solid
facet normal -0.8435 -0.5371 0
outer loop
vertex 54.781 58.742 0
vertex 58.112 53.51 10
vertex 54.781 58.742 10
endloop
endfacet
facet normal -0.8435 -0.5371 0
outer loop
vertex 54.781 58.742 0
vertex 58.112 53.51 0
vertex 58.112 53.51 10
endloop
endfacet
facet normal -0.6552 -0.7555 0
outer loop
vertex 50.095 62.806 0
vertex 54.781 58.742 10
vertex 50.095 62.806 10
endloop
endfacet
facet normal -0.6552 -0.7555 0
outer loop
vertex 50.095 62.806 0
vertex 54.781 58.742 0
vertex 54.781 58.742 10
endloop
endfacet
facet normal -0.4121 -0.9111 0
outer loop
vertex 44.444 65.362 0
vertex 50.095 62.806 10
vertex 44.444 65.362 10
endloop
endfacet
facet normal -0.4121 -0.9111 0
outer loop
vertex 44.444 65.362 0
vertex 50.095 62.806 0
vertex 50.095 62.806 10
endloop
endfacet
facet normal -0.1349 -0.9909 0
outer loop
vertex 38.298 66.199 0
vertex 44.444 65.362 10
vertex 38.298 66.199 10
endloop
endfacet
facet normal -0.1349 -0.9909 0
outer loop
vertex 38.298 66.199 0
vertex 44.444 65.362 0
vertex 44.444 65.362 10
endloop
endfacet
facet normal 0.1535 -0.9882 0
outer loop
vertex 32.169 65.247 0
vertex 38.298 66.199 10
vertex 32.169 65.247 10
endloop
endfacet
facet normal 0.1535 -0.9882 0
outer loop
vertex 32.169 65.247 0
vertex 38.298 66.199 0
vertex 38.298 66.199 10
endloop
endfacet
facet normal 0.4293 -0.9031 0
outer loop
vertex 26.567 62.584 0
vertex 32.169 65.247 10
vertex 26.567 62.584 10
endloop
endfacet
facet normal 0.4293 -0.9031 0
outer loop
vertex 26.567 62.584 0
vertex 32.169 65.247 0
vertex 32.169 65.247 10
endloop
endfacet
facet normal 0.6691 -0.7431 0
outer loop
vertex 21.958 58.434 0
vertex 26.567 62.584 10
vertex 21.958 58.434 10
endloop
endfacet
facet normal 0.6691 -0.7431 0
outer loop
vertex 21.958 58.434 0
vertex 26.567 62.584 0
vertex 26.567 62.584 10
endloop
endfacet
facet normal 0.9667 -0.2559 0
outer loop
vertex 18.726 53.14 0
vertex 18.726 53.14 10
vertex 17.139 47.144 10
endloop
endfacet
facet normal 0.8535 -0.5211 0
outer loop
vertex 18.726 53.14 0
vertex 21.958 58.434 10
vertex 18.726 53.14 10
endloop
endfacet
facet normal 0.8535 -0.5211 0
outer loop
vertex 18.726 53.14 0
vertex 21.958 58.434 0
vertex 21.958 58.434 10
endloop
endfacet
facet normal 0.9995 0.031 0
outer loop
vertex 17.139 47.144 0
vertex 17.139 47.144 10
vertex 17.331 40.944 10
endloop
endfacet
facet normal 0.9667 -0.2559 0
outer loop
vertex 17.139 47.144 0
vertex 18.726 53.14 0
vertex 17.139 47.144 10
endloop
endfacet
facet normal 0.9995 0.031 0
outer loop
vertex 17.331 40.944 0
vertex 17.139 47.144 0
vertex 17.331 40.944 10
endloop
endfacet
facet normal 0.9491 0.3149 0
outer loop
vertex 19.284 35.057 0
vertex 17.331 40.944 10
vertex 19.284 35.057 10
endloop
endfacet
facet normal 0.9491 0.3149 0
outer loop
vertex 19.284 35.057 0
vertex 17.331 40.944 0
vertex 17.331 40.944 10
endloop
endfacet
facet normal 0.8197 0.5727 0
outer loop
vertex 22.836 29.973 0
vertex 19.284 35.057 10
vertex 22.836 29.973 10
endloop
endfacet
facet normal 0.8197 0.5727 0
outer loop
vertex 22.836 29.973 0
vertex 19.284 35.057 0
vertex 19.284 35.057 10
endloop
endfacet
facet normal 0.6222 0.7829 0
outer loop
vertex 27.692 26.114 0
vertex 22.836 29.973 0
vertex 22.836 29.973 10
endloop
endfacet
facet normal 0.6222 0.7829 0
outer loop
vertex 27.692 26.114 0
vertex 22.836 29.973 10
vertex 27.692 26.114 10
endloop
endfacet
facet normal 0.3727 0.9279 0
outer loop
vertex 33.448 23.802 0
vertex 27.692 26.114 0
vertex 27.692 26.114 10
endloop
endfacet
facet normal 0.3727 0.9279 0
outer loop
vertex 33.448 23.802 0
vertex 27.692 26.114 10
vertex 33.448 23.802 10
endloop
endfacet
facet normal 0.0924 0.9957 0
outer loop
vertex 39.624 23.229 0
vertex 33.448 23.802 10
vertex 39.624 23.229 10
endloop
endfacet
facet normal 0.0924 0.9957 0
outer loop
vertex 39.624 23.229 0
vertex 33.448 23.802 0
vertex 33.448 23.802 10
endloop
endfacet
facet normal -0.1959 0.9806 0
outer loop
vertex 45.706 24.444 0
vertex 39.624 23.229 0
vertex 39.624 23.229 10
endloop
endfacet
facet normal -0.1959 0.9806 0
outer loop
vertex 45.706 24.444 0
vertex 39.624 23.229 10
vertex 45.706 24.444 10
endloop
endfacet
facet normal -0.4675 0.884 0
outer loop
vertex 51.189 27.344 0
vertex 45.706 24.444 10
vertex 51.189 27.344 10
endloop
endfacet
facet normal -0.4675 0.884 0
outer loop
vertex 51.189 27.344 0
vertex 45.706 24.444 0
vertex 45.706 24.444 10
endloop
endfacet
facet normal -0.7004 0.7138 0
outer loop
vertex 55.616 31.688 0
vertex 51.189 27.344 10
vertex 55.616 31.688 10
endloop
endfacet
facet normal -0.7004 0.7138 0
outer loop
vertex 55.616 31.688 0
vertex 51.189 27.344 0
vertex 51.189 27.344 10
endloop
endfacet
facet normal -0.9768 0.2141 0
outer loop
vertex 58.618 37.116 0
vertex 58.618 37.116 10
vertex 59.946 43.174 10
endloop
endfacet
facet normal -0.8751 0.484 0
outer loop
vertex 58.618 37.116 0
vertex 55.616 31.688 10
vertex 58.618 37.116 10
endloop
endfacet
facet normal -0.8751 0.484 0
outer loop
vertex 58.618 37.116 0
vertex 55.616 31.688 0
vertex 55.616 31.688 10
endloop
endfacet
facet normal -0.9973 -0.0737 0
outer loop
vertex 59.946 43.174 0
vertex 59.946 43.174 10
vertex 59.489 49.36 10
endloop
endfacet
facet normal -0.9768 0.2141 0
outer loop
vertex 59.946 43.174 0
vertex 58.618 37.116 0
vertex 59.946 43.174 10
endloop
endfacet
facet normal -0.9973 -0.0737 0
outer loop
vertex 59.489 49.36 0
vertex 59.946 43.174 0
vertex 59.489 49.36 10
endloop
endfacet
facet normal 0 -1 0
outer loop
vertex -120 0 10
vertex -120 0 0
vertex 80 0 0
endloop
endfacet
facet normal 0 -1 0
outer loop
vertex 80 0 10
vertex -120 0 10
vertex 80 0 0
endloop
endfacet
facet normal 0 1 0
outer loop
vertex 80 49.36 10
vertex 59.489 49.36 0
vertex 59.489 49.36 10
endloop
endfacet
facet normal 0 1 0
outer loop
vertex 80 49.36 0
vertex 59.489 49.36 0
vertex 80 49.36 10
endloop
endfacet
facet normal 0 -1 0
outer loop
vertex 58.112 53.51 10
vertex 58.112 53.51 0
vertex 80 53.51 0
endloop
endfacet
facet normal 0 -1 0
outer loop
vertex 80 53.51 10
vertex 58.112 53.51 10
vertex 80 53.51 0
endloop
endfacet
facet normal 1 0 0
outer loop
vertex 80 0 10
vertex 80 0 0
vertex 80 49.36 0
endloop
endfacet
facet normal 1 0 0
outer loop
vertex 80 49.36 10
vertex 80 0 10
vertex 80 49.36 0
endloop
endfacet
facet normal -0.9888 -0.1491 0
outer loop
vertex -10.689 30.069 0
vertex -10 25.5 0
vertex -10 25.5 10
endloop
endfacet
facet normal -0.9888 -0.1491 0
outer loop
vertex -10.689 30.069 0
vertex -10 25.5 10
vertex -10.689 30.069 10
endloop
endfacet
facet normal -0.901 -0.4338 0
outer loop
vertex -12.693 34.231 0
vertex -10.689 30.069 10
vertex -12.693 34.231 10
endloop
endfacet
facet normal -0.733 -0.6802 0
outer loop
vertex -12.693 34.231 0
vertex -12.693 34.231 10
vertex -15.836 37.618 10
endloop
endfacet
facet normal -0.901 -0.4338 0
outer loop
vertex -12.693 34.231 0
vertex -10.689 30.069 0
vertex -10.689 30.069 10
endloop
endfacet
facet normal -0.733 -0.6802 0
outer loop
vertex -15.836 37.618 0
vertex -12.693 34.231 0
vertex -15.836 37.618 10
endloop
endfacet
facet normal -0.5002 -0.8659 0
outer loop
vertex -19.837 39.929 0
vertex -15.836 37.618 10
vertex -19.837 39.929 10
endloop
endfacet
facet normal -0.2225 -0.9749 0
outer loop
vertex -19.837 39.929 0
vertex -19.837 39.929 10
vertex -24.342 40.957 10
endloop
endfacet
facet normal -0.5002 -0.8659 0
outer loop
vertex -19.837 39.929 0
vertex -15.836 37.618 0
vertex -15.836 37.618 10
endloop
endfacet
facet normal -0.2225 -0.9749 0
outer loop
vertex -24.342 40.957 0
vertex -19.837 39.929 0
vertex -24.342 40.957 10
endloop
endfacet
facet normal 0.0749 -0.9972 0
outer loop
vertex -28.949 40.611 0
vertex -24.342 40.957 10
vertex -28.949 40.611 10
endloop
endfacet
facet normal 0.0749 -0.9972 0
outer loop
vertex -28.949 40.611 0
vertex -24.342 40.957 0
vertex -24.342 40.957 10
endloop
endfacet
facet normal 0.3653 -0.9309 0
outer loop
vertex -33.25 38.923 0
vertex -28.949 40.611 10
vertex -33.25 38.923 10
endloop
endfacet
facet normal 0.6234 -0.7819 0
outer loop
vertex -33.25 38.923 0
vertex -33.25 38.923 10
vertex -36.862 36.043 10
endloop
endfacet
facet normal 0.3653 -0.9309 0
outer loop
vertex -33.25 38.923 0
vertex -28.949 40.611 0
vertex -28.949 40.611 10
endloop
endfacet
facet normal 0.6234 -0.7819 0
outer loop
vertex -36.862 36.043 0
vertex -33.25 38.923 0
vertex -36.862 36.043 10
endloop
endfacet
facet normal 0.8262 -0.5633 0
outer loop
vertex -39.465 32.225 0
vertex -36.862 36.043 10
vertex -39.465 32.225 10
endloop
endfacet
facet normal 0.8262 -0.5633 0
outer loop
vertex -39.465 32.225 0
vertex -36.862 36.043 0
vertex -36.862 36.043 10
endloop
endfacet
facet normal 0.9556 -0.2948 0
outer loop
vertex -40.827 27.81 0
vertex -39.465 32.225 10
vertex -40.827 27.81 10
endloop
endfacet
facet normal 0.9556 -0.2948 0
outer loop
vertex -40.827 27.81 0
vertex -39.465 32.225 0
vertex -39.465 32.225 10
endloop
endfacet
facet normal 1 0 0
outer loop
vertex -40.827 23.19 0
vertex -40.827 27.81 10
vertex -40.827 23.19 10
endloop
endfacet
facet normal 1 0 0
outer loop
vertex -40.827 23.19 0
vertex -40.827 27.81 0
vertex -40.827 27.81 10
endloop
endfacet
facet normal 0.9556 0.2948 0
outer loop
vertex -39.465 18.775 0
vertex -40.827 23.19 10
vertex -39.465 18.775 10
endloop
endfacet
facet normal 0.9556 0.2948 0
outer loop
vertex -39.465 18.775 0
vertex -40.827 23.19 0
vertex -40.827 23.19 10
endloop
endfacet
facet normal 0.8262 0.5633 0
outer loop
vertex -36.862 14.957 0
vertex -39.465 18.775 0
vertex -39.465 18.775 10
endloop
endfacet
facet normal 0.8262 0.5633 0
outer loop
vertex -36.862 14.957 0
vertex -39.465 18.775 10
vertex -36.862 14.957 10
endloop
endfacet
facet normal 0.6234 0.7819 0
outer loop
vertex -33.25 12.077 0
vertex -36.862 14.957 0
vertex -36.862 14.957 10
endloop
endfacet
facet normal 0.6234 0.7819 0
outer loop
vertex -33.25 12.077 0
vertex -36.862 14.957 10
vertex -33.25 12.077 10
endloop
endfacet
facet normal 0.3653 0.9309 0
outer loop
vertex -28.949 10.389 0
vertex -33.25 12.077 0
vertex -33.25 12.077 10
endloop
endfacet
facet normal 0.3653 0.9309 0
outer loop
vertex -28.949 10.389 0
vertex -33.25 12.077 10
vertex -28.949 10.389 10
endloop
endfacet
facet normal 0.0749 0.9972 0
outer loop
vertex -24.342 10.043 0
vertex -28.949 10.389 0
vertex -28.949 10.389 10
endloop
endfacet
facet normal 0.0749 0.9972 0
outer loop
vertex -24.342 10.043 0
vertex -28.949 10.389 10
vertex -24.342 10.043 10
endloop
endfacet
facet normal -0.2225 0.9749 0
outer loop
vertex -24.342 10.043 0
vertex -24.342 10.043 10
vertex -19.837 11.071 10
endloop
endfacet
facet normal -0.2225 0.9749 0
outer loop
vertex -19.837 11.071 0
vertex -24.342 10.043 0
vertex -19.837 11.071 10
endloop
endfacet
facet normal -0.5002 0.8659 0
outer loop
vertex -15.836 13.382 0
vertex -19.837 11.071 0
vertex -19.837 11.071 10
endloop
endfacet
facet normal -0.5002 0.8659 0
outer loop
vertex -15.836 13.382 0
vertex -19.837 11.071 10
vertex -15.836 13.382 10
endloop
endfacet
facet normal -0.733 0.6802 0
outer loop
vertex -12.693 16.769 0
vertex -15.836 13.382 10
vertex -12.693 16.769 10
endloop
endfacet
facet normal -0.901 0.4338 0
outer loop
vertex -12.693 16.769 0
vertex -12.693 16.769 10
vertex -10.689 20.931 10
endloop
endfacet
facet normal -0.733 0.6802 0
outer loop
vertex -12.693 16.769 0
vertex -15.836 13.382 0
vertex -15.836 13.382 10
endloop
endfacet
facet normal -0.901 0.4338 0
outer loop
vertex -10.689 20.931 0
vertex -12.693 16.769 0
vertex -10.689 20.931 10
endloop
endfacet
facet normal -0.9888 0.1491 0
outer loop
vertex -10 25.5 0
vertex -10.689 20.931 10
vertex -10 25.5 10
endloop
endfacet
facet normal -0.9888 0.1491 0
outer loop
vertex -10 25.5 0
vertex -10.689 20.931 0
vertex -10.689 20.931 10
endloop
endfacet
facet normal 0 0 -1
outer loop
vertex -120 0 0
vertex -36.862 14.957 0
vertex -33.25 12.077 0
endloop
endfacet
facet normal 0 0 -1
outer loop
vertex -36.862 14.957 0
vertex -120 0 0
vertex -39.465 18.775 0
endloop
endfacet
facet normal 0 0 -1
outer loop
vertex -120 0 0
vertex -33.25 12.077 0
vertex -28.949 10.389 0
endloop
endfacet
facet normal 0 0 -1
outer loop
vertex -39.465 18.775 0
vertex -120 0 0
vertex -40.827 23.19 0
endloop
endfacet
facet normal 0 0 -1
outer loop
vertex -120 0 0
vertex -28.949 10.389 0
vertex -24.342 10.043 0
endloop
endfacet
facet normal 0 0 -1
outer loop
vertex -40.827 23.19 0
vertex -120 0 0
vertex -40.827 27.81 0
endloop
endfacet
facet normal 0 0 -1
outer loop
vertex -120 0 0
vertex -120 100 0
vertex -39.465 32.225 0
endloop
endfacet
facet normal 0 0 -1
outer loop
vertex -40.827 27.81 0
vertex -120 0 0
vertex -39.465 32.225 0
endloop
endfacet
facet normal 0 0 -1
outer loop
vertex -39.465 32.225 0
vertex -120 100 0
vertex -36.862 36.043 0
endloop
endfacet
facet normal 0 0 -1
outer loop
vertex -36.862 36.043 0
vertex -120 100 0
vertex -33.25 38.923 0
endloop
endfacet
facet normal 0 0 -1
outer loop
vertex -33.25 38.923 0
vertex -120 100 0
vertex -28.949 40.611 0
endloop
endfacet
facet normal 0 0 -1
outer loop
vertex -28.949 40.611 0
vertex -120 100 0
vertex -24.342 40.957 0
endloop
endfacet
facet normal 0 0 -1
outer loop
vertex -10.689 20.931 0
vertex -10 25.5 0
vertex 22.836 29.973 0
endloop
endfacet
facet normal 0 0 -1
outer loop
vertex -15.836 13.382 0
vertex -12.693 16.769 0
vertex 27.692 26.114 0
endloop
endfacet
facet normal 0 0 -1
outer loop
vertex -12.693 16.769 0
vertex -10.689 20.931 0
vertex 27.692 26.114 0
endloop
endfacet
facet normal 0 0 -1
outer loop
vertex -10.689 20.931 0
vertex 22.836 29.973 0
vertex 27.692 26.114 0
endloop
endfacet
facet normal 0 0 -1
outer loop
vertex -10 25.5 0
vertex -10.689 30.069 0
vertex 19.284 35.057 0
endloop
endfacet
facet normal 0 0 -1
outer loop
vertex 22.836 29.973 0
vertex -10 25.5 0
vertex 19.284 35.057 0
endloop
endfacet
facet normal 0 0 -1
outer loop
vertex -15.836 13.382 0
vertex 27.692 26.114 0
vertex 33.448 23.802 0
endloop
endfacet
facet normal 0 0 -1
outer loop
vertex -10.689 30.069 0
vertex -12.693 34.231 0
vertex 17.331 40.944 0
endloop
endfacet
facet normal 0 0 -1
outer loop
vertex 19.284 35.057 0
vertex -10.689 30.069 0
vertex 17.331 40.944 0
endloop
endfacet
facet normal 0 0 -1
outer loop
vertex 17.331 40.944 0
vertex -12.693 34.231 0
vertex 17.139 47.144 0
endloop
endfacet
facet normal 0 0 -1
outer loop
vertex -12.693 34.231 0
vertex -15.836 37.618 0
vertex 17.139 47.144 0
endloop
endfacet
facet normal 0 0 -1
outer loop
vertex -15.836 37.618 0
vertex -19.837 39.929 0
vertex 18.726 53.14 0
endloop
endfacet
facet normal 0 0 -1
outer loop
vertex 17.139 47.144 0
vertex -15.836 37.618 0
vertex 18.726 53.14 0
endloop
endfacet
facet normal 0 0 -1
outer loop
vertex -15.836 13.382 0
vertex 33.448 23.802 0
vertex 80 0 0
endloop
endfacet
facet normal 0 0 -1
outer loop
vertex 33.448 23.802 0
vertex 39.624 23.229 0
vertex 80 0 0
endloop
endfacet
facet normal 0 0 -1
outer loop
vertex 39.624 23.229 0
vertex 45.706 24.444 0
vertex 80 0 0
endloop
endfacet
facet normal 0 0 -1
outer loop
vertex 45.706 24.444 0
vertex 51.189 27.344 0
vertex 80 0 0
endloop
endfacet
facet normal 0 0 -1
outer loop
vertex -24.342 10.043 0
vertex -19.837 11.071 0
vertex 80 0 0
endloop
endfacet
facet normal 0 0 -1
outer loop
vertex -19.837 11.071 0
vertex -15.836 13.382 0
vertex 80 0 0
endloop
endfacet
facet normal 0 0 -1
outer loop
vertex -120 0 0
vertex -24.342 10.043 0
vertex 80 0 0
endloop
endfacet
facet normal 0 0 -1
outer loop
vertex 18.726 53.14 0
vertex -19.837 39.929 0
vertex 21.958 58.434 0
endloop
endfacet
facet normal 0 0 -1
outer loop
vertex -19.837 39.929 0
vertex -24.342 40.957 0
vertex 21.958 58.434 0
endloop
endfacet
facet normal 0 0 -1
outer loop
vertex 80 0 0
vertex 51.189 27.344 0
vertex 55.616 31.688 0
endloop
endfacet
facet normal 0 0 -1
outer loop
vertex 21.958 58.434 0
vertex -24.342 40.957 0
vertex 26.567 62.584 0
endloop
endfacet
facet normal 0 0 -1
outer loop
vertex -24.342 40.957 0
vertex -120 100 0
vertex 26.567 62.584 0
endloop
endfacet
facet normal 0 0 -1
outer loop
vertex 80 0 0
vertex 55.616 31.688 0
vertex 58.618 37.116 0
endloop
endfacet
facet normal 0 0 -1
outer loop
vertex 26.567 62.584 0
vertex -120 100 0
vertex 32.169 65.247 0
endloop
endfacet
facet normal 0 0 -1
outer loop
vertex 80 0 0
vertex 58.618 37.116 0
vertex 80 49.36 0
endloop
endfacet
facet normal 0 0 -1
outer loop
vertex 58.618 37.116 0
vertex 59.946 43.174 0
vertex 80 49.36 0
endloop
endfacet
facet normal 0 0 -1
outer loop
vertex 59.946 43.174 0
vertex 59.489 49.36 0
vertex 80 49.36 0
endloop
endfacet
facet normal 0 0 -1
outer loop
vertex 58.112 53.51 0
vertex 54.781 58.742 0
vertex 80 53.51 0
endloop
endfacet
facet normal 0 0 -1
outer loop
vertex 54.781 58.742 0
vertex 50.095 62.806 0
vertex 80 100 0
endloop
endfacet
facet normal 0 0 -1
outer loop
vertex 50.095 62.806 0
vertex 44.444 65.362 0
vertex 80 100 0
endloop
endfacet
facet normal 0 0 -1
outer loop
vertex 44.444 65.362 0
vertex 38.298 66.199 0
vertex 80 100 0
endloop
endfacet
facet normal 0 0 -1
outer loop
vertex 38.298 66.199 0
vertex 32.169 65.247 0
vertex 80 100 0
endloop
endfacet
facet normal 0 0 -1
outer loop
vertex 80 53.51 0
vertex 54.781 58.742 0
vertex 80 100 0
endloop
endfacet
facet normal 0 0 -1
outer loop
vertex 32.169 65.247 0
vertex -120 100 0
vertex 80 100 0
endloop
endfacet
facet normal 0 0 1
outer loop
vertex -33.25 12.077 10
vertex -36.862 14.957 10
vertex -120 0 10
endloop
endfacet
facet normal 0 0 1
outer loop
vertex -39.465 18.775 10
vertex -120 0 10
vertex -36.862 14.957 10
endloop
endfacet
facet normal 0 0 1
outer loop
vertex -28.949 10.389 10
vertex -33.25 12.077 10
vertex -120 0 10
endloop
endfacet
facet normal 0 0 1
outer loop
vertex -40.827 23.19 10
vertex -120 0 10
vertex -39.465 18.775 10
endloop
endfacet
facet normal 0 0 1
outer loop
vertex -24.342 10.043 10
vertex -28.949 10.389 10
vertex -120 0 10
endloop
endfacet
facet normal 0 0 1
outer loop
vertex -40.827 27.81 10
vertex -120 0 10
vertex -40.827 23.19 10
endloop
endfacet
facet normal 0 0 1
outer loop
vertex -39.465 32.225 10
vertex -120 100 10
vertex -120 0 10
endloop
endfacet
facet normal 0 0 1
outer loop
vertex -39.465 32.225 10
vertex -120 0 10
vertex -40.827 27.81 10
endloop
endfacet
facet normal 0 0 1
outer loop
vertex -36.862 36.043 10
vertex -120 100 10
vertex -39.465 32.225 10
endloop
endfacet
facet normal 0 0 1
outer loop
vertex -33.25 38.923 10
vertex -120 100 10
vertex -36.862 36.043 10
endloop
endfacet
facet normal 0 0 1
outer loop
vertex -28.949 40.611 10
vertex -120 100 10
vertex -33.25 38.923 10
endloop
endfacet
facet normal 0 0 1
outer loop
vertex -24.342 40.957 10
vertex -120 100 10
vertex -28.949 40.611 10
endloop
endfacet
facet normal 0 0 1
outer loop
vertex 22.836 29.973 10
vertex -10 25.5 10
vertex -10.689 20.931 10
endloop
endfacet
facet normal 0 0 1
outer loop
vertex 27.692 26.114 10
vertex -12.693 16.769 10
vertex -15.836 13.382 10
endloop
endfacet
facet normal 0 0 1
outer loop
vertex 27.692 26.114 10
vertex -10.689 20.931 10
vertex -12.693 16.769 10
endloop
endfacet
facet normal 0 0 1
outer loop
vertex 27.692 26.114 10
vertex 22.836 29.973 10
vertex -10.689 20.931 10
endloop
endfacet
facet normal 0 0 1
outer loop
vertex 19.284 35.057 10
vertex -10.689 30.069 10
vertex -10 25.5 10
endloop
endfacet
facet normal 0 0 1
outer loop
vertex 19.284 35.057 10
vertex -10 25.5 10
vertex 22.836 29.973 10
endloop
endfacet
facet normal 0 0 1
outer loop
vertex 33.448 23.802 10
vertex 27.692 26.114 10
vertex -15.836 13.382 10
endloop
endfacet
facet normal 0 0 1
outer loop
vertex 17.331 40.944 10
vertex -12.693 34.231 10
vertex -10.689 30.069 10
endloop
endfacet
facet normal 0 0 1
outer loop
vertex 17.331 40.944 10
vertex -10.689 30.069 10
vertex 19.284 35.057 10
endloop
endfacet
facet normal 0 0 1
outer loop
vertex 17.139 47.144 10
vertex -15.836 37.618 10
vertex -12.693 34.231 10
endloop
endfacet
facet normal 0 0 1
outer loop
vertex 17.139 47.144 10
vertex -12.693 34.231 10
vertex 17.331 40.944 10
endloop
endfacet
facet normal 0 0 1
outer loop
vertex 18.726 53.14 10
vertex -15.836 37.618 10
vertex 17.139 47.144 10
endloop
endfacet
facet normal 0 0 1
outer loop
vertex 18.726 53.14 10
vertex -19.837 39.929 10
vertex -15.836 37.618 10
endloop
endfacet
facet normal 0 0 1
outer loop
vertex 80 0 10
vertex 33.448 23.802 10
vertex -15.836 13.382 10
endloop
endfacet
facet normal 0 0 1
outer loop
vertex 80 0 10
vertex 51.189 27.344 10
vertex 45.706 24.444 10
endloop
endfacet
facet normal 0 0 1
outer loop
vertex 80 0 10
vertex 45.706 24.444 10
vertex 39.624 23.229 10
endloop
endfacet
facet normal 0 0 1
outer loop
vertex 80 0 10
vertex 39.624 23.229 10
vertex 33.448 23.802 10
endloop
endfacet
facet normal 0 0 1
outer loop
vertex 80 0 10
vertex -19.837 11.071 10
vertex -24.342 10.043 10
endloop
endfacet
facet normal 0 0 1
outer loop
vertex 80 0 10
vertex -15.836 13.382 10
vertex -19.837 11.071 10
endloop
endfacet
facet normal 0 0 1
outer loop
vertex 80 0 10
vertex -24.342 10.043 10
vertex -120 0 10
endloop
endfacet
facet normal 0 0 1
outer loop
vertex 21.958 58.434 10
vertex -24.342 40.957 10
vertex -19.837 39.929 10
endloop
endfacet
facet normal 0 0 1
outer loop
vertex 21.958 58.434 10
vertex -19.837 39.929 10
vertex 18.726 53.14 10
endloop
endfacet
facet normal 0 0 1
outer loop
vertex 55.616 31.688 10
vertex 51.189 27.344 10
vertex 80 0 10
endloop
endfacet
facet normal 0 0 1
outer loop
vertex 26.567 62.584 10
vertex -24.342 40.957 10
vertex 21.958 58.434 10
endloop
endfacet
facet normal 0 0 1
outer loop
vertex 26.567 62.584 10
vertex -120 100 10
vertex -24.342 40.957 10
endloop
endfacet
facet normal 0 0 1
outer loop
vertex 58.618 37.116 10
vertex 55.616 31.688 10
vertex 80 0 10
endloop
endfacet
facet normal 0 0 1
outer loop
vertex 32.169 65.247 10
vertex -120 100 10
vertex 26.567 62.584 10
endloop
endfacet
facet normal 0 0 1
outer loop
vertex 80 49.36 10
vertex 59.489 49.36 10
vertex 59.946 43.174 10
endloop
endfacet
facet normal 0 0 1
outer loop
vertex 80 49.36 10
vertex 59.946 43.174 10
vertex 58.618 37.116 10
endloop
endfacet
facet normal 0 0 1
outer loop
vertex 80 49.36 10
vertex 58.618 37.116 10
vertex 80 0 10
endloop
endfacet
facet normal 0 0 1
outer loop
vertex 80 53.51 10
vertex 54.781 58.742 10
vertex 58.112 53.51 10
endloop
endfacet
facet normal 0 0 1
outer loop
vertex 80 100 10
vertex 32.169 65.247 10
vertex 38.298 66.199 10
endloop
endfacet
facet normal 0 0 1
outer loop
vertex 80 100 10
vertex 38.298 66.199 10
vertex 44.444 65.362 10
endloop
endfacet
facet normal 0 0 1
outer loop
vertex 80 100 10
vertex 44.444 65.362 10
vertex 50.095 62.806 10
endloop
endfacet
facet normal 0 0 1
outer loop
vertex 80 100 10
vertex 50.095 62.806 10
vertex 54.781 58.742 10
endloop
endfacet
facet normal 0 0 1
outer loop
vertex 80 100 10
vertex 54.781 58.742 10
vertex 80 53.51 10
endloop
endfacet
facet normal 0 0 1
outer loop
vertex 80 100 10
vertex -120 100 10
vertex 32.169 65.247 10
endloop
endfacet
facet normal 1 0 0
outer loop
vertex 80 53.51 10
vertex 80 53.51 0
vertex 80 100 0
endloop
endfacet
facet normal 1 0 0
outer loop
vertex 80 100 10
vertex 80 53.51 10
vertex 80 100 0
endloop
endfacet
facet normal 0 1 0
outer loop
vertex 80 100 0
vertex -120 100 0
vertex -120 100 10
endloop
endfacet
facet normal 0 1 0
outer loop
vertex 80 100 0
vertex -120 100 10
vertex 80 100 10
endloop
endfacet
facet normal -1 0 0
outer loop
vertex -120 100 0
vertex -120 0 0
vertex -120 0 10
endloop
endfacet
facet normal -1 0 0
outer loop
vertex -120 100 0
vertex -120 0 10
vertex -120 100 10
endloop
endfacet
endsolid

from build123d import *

# Parameters (mm, degrees)
BOX002_W          = 22
BOX002_H          = 4.15
BOX002_DEPTH      = 10
CYLINDER002_R     = 15.5
CYLINDER002_DEPTH = 10
CYLINDER001_R     = 21.5
CYLINDER001_DEPTH = 10
BOX001_W          = 200
BOX001_H          = 100
BOX001_DEPTH      = 10
CYLINDER_R        = 21.5
CYLINDER_DEPTH    = 10
BOX_W             = 80
BOX_H             = 80
BOX_DEPTH         = 10


with BuildPart() as cube:
    # Box002 → Box002 (new body)
    with BuildSketch(Plane(origin=(58, 49.36, 0), x_dir=(1, 0, 0), z_dir=(0, 0, 1))):
        with Locations((11, 2.075)):
            Rectangle(BOX002_W, BOX002_H)
    extrude(amount=BOX002_DEPTH)


with BuildPart() as cylinder002:
    # Cylinder002 → Cylinder002 (new body)
    with BuildSketch(Plane(origin=(-25.5, 25.5, 0), x_dir=(1, 0, 0), z_dir=(0, 0, 1))):
        Circle(CYLINDER002_R)
    extrude(amount=CYLINDER002_DEPTH)


with BuildPart() as cylinder001:
    # Cylinder001 → Cylinder001 (new body)
    with BuildSketch(Plane(origin=(38.5, 44.7, 0), x_dir=(1, 0, 0), z_dir=(0, 0, 1))):
        Circle(CYLINDER001_R)
    extrude(amount=CYLINDER001_DEPTH)


with BuildPart() as cut001:
    # Box001 → Box001 (new body)
    with BuildSketch(Plane(origin=(-120, 0, 0), x_dir=(1, 0, 0), z_dir=(0, 0, 1))):
        with Locations((100, 50)):
            Rectangle(BOX001_W, BOX001_H)
    extrude(amount=BOX001_DEPTH)

    # Cut001: cut Cylinder001
    add(cylinder001.part, mode=Mode.SUBTRACT)


with BuildPart() as cylinder:
    # Cylinder → Cylinder (new body)
    with BuildSketch(Plane(origin=(38.5, 44.7, 0), x_dir=(1, 0, 0), z_dir=(0, 0, 1))):
        Circle(CYLINDER_R)
    extrude(amount=CYLINDER_DEPTH)


with BuildPart() as cut003:
    # Box → Box (new body)
    with BuildSketch(Plane.XY):
        with Locations((40, 40)):
            Rectangle(BOX_W, BOX_H)
    extrude(amount=BOX_DEPTH)

    # Cut: cut Cylinder
    add(cylinder.part, mode=Mode.SUBTRACT)

    # Fusion: union Cut001
    add(cut001.part)

    # Cut002: cut Cylinder002
    add(cylinder002.part, mode=Mode.SUBTRACT)

    # Cut003: cut Cube
    add(cube.part, mode=Mode.SUBTRACT)


solid = cut003.part
